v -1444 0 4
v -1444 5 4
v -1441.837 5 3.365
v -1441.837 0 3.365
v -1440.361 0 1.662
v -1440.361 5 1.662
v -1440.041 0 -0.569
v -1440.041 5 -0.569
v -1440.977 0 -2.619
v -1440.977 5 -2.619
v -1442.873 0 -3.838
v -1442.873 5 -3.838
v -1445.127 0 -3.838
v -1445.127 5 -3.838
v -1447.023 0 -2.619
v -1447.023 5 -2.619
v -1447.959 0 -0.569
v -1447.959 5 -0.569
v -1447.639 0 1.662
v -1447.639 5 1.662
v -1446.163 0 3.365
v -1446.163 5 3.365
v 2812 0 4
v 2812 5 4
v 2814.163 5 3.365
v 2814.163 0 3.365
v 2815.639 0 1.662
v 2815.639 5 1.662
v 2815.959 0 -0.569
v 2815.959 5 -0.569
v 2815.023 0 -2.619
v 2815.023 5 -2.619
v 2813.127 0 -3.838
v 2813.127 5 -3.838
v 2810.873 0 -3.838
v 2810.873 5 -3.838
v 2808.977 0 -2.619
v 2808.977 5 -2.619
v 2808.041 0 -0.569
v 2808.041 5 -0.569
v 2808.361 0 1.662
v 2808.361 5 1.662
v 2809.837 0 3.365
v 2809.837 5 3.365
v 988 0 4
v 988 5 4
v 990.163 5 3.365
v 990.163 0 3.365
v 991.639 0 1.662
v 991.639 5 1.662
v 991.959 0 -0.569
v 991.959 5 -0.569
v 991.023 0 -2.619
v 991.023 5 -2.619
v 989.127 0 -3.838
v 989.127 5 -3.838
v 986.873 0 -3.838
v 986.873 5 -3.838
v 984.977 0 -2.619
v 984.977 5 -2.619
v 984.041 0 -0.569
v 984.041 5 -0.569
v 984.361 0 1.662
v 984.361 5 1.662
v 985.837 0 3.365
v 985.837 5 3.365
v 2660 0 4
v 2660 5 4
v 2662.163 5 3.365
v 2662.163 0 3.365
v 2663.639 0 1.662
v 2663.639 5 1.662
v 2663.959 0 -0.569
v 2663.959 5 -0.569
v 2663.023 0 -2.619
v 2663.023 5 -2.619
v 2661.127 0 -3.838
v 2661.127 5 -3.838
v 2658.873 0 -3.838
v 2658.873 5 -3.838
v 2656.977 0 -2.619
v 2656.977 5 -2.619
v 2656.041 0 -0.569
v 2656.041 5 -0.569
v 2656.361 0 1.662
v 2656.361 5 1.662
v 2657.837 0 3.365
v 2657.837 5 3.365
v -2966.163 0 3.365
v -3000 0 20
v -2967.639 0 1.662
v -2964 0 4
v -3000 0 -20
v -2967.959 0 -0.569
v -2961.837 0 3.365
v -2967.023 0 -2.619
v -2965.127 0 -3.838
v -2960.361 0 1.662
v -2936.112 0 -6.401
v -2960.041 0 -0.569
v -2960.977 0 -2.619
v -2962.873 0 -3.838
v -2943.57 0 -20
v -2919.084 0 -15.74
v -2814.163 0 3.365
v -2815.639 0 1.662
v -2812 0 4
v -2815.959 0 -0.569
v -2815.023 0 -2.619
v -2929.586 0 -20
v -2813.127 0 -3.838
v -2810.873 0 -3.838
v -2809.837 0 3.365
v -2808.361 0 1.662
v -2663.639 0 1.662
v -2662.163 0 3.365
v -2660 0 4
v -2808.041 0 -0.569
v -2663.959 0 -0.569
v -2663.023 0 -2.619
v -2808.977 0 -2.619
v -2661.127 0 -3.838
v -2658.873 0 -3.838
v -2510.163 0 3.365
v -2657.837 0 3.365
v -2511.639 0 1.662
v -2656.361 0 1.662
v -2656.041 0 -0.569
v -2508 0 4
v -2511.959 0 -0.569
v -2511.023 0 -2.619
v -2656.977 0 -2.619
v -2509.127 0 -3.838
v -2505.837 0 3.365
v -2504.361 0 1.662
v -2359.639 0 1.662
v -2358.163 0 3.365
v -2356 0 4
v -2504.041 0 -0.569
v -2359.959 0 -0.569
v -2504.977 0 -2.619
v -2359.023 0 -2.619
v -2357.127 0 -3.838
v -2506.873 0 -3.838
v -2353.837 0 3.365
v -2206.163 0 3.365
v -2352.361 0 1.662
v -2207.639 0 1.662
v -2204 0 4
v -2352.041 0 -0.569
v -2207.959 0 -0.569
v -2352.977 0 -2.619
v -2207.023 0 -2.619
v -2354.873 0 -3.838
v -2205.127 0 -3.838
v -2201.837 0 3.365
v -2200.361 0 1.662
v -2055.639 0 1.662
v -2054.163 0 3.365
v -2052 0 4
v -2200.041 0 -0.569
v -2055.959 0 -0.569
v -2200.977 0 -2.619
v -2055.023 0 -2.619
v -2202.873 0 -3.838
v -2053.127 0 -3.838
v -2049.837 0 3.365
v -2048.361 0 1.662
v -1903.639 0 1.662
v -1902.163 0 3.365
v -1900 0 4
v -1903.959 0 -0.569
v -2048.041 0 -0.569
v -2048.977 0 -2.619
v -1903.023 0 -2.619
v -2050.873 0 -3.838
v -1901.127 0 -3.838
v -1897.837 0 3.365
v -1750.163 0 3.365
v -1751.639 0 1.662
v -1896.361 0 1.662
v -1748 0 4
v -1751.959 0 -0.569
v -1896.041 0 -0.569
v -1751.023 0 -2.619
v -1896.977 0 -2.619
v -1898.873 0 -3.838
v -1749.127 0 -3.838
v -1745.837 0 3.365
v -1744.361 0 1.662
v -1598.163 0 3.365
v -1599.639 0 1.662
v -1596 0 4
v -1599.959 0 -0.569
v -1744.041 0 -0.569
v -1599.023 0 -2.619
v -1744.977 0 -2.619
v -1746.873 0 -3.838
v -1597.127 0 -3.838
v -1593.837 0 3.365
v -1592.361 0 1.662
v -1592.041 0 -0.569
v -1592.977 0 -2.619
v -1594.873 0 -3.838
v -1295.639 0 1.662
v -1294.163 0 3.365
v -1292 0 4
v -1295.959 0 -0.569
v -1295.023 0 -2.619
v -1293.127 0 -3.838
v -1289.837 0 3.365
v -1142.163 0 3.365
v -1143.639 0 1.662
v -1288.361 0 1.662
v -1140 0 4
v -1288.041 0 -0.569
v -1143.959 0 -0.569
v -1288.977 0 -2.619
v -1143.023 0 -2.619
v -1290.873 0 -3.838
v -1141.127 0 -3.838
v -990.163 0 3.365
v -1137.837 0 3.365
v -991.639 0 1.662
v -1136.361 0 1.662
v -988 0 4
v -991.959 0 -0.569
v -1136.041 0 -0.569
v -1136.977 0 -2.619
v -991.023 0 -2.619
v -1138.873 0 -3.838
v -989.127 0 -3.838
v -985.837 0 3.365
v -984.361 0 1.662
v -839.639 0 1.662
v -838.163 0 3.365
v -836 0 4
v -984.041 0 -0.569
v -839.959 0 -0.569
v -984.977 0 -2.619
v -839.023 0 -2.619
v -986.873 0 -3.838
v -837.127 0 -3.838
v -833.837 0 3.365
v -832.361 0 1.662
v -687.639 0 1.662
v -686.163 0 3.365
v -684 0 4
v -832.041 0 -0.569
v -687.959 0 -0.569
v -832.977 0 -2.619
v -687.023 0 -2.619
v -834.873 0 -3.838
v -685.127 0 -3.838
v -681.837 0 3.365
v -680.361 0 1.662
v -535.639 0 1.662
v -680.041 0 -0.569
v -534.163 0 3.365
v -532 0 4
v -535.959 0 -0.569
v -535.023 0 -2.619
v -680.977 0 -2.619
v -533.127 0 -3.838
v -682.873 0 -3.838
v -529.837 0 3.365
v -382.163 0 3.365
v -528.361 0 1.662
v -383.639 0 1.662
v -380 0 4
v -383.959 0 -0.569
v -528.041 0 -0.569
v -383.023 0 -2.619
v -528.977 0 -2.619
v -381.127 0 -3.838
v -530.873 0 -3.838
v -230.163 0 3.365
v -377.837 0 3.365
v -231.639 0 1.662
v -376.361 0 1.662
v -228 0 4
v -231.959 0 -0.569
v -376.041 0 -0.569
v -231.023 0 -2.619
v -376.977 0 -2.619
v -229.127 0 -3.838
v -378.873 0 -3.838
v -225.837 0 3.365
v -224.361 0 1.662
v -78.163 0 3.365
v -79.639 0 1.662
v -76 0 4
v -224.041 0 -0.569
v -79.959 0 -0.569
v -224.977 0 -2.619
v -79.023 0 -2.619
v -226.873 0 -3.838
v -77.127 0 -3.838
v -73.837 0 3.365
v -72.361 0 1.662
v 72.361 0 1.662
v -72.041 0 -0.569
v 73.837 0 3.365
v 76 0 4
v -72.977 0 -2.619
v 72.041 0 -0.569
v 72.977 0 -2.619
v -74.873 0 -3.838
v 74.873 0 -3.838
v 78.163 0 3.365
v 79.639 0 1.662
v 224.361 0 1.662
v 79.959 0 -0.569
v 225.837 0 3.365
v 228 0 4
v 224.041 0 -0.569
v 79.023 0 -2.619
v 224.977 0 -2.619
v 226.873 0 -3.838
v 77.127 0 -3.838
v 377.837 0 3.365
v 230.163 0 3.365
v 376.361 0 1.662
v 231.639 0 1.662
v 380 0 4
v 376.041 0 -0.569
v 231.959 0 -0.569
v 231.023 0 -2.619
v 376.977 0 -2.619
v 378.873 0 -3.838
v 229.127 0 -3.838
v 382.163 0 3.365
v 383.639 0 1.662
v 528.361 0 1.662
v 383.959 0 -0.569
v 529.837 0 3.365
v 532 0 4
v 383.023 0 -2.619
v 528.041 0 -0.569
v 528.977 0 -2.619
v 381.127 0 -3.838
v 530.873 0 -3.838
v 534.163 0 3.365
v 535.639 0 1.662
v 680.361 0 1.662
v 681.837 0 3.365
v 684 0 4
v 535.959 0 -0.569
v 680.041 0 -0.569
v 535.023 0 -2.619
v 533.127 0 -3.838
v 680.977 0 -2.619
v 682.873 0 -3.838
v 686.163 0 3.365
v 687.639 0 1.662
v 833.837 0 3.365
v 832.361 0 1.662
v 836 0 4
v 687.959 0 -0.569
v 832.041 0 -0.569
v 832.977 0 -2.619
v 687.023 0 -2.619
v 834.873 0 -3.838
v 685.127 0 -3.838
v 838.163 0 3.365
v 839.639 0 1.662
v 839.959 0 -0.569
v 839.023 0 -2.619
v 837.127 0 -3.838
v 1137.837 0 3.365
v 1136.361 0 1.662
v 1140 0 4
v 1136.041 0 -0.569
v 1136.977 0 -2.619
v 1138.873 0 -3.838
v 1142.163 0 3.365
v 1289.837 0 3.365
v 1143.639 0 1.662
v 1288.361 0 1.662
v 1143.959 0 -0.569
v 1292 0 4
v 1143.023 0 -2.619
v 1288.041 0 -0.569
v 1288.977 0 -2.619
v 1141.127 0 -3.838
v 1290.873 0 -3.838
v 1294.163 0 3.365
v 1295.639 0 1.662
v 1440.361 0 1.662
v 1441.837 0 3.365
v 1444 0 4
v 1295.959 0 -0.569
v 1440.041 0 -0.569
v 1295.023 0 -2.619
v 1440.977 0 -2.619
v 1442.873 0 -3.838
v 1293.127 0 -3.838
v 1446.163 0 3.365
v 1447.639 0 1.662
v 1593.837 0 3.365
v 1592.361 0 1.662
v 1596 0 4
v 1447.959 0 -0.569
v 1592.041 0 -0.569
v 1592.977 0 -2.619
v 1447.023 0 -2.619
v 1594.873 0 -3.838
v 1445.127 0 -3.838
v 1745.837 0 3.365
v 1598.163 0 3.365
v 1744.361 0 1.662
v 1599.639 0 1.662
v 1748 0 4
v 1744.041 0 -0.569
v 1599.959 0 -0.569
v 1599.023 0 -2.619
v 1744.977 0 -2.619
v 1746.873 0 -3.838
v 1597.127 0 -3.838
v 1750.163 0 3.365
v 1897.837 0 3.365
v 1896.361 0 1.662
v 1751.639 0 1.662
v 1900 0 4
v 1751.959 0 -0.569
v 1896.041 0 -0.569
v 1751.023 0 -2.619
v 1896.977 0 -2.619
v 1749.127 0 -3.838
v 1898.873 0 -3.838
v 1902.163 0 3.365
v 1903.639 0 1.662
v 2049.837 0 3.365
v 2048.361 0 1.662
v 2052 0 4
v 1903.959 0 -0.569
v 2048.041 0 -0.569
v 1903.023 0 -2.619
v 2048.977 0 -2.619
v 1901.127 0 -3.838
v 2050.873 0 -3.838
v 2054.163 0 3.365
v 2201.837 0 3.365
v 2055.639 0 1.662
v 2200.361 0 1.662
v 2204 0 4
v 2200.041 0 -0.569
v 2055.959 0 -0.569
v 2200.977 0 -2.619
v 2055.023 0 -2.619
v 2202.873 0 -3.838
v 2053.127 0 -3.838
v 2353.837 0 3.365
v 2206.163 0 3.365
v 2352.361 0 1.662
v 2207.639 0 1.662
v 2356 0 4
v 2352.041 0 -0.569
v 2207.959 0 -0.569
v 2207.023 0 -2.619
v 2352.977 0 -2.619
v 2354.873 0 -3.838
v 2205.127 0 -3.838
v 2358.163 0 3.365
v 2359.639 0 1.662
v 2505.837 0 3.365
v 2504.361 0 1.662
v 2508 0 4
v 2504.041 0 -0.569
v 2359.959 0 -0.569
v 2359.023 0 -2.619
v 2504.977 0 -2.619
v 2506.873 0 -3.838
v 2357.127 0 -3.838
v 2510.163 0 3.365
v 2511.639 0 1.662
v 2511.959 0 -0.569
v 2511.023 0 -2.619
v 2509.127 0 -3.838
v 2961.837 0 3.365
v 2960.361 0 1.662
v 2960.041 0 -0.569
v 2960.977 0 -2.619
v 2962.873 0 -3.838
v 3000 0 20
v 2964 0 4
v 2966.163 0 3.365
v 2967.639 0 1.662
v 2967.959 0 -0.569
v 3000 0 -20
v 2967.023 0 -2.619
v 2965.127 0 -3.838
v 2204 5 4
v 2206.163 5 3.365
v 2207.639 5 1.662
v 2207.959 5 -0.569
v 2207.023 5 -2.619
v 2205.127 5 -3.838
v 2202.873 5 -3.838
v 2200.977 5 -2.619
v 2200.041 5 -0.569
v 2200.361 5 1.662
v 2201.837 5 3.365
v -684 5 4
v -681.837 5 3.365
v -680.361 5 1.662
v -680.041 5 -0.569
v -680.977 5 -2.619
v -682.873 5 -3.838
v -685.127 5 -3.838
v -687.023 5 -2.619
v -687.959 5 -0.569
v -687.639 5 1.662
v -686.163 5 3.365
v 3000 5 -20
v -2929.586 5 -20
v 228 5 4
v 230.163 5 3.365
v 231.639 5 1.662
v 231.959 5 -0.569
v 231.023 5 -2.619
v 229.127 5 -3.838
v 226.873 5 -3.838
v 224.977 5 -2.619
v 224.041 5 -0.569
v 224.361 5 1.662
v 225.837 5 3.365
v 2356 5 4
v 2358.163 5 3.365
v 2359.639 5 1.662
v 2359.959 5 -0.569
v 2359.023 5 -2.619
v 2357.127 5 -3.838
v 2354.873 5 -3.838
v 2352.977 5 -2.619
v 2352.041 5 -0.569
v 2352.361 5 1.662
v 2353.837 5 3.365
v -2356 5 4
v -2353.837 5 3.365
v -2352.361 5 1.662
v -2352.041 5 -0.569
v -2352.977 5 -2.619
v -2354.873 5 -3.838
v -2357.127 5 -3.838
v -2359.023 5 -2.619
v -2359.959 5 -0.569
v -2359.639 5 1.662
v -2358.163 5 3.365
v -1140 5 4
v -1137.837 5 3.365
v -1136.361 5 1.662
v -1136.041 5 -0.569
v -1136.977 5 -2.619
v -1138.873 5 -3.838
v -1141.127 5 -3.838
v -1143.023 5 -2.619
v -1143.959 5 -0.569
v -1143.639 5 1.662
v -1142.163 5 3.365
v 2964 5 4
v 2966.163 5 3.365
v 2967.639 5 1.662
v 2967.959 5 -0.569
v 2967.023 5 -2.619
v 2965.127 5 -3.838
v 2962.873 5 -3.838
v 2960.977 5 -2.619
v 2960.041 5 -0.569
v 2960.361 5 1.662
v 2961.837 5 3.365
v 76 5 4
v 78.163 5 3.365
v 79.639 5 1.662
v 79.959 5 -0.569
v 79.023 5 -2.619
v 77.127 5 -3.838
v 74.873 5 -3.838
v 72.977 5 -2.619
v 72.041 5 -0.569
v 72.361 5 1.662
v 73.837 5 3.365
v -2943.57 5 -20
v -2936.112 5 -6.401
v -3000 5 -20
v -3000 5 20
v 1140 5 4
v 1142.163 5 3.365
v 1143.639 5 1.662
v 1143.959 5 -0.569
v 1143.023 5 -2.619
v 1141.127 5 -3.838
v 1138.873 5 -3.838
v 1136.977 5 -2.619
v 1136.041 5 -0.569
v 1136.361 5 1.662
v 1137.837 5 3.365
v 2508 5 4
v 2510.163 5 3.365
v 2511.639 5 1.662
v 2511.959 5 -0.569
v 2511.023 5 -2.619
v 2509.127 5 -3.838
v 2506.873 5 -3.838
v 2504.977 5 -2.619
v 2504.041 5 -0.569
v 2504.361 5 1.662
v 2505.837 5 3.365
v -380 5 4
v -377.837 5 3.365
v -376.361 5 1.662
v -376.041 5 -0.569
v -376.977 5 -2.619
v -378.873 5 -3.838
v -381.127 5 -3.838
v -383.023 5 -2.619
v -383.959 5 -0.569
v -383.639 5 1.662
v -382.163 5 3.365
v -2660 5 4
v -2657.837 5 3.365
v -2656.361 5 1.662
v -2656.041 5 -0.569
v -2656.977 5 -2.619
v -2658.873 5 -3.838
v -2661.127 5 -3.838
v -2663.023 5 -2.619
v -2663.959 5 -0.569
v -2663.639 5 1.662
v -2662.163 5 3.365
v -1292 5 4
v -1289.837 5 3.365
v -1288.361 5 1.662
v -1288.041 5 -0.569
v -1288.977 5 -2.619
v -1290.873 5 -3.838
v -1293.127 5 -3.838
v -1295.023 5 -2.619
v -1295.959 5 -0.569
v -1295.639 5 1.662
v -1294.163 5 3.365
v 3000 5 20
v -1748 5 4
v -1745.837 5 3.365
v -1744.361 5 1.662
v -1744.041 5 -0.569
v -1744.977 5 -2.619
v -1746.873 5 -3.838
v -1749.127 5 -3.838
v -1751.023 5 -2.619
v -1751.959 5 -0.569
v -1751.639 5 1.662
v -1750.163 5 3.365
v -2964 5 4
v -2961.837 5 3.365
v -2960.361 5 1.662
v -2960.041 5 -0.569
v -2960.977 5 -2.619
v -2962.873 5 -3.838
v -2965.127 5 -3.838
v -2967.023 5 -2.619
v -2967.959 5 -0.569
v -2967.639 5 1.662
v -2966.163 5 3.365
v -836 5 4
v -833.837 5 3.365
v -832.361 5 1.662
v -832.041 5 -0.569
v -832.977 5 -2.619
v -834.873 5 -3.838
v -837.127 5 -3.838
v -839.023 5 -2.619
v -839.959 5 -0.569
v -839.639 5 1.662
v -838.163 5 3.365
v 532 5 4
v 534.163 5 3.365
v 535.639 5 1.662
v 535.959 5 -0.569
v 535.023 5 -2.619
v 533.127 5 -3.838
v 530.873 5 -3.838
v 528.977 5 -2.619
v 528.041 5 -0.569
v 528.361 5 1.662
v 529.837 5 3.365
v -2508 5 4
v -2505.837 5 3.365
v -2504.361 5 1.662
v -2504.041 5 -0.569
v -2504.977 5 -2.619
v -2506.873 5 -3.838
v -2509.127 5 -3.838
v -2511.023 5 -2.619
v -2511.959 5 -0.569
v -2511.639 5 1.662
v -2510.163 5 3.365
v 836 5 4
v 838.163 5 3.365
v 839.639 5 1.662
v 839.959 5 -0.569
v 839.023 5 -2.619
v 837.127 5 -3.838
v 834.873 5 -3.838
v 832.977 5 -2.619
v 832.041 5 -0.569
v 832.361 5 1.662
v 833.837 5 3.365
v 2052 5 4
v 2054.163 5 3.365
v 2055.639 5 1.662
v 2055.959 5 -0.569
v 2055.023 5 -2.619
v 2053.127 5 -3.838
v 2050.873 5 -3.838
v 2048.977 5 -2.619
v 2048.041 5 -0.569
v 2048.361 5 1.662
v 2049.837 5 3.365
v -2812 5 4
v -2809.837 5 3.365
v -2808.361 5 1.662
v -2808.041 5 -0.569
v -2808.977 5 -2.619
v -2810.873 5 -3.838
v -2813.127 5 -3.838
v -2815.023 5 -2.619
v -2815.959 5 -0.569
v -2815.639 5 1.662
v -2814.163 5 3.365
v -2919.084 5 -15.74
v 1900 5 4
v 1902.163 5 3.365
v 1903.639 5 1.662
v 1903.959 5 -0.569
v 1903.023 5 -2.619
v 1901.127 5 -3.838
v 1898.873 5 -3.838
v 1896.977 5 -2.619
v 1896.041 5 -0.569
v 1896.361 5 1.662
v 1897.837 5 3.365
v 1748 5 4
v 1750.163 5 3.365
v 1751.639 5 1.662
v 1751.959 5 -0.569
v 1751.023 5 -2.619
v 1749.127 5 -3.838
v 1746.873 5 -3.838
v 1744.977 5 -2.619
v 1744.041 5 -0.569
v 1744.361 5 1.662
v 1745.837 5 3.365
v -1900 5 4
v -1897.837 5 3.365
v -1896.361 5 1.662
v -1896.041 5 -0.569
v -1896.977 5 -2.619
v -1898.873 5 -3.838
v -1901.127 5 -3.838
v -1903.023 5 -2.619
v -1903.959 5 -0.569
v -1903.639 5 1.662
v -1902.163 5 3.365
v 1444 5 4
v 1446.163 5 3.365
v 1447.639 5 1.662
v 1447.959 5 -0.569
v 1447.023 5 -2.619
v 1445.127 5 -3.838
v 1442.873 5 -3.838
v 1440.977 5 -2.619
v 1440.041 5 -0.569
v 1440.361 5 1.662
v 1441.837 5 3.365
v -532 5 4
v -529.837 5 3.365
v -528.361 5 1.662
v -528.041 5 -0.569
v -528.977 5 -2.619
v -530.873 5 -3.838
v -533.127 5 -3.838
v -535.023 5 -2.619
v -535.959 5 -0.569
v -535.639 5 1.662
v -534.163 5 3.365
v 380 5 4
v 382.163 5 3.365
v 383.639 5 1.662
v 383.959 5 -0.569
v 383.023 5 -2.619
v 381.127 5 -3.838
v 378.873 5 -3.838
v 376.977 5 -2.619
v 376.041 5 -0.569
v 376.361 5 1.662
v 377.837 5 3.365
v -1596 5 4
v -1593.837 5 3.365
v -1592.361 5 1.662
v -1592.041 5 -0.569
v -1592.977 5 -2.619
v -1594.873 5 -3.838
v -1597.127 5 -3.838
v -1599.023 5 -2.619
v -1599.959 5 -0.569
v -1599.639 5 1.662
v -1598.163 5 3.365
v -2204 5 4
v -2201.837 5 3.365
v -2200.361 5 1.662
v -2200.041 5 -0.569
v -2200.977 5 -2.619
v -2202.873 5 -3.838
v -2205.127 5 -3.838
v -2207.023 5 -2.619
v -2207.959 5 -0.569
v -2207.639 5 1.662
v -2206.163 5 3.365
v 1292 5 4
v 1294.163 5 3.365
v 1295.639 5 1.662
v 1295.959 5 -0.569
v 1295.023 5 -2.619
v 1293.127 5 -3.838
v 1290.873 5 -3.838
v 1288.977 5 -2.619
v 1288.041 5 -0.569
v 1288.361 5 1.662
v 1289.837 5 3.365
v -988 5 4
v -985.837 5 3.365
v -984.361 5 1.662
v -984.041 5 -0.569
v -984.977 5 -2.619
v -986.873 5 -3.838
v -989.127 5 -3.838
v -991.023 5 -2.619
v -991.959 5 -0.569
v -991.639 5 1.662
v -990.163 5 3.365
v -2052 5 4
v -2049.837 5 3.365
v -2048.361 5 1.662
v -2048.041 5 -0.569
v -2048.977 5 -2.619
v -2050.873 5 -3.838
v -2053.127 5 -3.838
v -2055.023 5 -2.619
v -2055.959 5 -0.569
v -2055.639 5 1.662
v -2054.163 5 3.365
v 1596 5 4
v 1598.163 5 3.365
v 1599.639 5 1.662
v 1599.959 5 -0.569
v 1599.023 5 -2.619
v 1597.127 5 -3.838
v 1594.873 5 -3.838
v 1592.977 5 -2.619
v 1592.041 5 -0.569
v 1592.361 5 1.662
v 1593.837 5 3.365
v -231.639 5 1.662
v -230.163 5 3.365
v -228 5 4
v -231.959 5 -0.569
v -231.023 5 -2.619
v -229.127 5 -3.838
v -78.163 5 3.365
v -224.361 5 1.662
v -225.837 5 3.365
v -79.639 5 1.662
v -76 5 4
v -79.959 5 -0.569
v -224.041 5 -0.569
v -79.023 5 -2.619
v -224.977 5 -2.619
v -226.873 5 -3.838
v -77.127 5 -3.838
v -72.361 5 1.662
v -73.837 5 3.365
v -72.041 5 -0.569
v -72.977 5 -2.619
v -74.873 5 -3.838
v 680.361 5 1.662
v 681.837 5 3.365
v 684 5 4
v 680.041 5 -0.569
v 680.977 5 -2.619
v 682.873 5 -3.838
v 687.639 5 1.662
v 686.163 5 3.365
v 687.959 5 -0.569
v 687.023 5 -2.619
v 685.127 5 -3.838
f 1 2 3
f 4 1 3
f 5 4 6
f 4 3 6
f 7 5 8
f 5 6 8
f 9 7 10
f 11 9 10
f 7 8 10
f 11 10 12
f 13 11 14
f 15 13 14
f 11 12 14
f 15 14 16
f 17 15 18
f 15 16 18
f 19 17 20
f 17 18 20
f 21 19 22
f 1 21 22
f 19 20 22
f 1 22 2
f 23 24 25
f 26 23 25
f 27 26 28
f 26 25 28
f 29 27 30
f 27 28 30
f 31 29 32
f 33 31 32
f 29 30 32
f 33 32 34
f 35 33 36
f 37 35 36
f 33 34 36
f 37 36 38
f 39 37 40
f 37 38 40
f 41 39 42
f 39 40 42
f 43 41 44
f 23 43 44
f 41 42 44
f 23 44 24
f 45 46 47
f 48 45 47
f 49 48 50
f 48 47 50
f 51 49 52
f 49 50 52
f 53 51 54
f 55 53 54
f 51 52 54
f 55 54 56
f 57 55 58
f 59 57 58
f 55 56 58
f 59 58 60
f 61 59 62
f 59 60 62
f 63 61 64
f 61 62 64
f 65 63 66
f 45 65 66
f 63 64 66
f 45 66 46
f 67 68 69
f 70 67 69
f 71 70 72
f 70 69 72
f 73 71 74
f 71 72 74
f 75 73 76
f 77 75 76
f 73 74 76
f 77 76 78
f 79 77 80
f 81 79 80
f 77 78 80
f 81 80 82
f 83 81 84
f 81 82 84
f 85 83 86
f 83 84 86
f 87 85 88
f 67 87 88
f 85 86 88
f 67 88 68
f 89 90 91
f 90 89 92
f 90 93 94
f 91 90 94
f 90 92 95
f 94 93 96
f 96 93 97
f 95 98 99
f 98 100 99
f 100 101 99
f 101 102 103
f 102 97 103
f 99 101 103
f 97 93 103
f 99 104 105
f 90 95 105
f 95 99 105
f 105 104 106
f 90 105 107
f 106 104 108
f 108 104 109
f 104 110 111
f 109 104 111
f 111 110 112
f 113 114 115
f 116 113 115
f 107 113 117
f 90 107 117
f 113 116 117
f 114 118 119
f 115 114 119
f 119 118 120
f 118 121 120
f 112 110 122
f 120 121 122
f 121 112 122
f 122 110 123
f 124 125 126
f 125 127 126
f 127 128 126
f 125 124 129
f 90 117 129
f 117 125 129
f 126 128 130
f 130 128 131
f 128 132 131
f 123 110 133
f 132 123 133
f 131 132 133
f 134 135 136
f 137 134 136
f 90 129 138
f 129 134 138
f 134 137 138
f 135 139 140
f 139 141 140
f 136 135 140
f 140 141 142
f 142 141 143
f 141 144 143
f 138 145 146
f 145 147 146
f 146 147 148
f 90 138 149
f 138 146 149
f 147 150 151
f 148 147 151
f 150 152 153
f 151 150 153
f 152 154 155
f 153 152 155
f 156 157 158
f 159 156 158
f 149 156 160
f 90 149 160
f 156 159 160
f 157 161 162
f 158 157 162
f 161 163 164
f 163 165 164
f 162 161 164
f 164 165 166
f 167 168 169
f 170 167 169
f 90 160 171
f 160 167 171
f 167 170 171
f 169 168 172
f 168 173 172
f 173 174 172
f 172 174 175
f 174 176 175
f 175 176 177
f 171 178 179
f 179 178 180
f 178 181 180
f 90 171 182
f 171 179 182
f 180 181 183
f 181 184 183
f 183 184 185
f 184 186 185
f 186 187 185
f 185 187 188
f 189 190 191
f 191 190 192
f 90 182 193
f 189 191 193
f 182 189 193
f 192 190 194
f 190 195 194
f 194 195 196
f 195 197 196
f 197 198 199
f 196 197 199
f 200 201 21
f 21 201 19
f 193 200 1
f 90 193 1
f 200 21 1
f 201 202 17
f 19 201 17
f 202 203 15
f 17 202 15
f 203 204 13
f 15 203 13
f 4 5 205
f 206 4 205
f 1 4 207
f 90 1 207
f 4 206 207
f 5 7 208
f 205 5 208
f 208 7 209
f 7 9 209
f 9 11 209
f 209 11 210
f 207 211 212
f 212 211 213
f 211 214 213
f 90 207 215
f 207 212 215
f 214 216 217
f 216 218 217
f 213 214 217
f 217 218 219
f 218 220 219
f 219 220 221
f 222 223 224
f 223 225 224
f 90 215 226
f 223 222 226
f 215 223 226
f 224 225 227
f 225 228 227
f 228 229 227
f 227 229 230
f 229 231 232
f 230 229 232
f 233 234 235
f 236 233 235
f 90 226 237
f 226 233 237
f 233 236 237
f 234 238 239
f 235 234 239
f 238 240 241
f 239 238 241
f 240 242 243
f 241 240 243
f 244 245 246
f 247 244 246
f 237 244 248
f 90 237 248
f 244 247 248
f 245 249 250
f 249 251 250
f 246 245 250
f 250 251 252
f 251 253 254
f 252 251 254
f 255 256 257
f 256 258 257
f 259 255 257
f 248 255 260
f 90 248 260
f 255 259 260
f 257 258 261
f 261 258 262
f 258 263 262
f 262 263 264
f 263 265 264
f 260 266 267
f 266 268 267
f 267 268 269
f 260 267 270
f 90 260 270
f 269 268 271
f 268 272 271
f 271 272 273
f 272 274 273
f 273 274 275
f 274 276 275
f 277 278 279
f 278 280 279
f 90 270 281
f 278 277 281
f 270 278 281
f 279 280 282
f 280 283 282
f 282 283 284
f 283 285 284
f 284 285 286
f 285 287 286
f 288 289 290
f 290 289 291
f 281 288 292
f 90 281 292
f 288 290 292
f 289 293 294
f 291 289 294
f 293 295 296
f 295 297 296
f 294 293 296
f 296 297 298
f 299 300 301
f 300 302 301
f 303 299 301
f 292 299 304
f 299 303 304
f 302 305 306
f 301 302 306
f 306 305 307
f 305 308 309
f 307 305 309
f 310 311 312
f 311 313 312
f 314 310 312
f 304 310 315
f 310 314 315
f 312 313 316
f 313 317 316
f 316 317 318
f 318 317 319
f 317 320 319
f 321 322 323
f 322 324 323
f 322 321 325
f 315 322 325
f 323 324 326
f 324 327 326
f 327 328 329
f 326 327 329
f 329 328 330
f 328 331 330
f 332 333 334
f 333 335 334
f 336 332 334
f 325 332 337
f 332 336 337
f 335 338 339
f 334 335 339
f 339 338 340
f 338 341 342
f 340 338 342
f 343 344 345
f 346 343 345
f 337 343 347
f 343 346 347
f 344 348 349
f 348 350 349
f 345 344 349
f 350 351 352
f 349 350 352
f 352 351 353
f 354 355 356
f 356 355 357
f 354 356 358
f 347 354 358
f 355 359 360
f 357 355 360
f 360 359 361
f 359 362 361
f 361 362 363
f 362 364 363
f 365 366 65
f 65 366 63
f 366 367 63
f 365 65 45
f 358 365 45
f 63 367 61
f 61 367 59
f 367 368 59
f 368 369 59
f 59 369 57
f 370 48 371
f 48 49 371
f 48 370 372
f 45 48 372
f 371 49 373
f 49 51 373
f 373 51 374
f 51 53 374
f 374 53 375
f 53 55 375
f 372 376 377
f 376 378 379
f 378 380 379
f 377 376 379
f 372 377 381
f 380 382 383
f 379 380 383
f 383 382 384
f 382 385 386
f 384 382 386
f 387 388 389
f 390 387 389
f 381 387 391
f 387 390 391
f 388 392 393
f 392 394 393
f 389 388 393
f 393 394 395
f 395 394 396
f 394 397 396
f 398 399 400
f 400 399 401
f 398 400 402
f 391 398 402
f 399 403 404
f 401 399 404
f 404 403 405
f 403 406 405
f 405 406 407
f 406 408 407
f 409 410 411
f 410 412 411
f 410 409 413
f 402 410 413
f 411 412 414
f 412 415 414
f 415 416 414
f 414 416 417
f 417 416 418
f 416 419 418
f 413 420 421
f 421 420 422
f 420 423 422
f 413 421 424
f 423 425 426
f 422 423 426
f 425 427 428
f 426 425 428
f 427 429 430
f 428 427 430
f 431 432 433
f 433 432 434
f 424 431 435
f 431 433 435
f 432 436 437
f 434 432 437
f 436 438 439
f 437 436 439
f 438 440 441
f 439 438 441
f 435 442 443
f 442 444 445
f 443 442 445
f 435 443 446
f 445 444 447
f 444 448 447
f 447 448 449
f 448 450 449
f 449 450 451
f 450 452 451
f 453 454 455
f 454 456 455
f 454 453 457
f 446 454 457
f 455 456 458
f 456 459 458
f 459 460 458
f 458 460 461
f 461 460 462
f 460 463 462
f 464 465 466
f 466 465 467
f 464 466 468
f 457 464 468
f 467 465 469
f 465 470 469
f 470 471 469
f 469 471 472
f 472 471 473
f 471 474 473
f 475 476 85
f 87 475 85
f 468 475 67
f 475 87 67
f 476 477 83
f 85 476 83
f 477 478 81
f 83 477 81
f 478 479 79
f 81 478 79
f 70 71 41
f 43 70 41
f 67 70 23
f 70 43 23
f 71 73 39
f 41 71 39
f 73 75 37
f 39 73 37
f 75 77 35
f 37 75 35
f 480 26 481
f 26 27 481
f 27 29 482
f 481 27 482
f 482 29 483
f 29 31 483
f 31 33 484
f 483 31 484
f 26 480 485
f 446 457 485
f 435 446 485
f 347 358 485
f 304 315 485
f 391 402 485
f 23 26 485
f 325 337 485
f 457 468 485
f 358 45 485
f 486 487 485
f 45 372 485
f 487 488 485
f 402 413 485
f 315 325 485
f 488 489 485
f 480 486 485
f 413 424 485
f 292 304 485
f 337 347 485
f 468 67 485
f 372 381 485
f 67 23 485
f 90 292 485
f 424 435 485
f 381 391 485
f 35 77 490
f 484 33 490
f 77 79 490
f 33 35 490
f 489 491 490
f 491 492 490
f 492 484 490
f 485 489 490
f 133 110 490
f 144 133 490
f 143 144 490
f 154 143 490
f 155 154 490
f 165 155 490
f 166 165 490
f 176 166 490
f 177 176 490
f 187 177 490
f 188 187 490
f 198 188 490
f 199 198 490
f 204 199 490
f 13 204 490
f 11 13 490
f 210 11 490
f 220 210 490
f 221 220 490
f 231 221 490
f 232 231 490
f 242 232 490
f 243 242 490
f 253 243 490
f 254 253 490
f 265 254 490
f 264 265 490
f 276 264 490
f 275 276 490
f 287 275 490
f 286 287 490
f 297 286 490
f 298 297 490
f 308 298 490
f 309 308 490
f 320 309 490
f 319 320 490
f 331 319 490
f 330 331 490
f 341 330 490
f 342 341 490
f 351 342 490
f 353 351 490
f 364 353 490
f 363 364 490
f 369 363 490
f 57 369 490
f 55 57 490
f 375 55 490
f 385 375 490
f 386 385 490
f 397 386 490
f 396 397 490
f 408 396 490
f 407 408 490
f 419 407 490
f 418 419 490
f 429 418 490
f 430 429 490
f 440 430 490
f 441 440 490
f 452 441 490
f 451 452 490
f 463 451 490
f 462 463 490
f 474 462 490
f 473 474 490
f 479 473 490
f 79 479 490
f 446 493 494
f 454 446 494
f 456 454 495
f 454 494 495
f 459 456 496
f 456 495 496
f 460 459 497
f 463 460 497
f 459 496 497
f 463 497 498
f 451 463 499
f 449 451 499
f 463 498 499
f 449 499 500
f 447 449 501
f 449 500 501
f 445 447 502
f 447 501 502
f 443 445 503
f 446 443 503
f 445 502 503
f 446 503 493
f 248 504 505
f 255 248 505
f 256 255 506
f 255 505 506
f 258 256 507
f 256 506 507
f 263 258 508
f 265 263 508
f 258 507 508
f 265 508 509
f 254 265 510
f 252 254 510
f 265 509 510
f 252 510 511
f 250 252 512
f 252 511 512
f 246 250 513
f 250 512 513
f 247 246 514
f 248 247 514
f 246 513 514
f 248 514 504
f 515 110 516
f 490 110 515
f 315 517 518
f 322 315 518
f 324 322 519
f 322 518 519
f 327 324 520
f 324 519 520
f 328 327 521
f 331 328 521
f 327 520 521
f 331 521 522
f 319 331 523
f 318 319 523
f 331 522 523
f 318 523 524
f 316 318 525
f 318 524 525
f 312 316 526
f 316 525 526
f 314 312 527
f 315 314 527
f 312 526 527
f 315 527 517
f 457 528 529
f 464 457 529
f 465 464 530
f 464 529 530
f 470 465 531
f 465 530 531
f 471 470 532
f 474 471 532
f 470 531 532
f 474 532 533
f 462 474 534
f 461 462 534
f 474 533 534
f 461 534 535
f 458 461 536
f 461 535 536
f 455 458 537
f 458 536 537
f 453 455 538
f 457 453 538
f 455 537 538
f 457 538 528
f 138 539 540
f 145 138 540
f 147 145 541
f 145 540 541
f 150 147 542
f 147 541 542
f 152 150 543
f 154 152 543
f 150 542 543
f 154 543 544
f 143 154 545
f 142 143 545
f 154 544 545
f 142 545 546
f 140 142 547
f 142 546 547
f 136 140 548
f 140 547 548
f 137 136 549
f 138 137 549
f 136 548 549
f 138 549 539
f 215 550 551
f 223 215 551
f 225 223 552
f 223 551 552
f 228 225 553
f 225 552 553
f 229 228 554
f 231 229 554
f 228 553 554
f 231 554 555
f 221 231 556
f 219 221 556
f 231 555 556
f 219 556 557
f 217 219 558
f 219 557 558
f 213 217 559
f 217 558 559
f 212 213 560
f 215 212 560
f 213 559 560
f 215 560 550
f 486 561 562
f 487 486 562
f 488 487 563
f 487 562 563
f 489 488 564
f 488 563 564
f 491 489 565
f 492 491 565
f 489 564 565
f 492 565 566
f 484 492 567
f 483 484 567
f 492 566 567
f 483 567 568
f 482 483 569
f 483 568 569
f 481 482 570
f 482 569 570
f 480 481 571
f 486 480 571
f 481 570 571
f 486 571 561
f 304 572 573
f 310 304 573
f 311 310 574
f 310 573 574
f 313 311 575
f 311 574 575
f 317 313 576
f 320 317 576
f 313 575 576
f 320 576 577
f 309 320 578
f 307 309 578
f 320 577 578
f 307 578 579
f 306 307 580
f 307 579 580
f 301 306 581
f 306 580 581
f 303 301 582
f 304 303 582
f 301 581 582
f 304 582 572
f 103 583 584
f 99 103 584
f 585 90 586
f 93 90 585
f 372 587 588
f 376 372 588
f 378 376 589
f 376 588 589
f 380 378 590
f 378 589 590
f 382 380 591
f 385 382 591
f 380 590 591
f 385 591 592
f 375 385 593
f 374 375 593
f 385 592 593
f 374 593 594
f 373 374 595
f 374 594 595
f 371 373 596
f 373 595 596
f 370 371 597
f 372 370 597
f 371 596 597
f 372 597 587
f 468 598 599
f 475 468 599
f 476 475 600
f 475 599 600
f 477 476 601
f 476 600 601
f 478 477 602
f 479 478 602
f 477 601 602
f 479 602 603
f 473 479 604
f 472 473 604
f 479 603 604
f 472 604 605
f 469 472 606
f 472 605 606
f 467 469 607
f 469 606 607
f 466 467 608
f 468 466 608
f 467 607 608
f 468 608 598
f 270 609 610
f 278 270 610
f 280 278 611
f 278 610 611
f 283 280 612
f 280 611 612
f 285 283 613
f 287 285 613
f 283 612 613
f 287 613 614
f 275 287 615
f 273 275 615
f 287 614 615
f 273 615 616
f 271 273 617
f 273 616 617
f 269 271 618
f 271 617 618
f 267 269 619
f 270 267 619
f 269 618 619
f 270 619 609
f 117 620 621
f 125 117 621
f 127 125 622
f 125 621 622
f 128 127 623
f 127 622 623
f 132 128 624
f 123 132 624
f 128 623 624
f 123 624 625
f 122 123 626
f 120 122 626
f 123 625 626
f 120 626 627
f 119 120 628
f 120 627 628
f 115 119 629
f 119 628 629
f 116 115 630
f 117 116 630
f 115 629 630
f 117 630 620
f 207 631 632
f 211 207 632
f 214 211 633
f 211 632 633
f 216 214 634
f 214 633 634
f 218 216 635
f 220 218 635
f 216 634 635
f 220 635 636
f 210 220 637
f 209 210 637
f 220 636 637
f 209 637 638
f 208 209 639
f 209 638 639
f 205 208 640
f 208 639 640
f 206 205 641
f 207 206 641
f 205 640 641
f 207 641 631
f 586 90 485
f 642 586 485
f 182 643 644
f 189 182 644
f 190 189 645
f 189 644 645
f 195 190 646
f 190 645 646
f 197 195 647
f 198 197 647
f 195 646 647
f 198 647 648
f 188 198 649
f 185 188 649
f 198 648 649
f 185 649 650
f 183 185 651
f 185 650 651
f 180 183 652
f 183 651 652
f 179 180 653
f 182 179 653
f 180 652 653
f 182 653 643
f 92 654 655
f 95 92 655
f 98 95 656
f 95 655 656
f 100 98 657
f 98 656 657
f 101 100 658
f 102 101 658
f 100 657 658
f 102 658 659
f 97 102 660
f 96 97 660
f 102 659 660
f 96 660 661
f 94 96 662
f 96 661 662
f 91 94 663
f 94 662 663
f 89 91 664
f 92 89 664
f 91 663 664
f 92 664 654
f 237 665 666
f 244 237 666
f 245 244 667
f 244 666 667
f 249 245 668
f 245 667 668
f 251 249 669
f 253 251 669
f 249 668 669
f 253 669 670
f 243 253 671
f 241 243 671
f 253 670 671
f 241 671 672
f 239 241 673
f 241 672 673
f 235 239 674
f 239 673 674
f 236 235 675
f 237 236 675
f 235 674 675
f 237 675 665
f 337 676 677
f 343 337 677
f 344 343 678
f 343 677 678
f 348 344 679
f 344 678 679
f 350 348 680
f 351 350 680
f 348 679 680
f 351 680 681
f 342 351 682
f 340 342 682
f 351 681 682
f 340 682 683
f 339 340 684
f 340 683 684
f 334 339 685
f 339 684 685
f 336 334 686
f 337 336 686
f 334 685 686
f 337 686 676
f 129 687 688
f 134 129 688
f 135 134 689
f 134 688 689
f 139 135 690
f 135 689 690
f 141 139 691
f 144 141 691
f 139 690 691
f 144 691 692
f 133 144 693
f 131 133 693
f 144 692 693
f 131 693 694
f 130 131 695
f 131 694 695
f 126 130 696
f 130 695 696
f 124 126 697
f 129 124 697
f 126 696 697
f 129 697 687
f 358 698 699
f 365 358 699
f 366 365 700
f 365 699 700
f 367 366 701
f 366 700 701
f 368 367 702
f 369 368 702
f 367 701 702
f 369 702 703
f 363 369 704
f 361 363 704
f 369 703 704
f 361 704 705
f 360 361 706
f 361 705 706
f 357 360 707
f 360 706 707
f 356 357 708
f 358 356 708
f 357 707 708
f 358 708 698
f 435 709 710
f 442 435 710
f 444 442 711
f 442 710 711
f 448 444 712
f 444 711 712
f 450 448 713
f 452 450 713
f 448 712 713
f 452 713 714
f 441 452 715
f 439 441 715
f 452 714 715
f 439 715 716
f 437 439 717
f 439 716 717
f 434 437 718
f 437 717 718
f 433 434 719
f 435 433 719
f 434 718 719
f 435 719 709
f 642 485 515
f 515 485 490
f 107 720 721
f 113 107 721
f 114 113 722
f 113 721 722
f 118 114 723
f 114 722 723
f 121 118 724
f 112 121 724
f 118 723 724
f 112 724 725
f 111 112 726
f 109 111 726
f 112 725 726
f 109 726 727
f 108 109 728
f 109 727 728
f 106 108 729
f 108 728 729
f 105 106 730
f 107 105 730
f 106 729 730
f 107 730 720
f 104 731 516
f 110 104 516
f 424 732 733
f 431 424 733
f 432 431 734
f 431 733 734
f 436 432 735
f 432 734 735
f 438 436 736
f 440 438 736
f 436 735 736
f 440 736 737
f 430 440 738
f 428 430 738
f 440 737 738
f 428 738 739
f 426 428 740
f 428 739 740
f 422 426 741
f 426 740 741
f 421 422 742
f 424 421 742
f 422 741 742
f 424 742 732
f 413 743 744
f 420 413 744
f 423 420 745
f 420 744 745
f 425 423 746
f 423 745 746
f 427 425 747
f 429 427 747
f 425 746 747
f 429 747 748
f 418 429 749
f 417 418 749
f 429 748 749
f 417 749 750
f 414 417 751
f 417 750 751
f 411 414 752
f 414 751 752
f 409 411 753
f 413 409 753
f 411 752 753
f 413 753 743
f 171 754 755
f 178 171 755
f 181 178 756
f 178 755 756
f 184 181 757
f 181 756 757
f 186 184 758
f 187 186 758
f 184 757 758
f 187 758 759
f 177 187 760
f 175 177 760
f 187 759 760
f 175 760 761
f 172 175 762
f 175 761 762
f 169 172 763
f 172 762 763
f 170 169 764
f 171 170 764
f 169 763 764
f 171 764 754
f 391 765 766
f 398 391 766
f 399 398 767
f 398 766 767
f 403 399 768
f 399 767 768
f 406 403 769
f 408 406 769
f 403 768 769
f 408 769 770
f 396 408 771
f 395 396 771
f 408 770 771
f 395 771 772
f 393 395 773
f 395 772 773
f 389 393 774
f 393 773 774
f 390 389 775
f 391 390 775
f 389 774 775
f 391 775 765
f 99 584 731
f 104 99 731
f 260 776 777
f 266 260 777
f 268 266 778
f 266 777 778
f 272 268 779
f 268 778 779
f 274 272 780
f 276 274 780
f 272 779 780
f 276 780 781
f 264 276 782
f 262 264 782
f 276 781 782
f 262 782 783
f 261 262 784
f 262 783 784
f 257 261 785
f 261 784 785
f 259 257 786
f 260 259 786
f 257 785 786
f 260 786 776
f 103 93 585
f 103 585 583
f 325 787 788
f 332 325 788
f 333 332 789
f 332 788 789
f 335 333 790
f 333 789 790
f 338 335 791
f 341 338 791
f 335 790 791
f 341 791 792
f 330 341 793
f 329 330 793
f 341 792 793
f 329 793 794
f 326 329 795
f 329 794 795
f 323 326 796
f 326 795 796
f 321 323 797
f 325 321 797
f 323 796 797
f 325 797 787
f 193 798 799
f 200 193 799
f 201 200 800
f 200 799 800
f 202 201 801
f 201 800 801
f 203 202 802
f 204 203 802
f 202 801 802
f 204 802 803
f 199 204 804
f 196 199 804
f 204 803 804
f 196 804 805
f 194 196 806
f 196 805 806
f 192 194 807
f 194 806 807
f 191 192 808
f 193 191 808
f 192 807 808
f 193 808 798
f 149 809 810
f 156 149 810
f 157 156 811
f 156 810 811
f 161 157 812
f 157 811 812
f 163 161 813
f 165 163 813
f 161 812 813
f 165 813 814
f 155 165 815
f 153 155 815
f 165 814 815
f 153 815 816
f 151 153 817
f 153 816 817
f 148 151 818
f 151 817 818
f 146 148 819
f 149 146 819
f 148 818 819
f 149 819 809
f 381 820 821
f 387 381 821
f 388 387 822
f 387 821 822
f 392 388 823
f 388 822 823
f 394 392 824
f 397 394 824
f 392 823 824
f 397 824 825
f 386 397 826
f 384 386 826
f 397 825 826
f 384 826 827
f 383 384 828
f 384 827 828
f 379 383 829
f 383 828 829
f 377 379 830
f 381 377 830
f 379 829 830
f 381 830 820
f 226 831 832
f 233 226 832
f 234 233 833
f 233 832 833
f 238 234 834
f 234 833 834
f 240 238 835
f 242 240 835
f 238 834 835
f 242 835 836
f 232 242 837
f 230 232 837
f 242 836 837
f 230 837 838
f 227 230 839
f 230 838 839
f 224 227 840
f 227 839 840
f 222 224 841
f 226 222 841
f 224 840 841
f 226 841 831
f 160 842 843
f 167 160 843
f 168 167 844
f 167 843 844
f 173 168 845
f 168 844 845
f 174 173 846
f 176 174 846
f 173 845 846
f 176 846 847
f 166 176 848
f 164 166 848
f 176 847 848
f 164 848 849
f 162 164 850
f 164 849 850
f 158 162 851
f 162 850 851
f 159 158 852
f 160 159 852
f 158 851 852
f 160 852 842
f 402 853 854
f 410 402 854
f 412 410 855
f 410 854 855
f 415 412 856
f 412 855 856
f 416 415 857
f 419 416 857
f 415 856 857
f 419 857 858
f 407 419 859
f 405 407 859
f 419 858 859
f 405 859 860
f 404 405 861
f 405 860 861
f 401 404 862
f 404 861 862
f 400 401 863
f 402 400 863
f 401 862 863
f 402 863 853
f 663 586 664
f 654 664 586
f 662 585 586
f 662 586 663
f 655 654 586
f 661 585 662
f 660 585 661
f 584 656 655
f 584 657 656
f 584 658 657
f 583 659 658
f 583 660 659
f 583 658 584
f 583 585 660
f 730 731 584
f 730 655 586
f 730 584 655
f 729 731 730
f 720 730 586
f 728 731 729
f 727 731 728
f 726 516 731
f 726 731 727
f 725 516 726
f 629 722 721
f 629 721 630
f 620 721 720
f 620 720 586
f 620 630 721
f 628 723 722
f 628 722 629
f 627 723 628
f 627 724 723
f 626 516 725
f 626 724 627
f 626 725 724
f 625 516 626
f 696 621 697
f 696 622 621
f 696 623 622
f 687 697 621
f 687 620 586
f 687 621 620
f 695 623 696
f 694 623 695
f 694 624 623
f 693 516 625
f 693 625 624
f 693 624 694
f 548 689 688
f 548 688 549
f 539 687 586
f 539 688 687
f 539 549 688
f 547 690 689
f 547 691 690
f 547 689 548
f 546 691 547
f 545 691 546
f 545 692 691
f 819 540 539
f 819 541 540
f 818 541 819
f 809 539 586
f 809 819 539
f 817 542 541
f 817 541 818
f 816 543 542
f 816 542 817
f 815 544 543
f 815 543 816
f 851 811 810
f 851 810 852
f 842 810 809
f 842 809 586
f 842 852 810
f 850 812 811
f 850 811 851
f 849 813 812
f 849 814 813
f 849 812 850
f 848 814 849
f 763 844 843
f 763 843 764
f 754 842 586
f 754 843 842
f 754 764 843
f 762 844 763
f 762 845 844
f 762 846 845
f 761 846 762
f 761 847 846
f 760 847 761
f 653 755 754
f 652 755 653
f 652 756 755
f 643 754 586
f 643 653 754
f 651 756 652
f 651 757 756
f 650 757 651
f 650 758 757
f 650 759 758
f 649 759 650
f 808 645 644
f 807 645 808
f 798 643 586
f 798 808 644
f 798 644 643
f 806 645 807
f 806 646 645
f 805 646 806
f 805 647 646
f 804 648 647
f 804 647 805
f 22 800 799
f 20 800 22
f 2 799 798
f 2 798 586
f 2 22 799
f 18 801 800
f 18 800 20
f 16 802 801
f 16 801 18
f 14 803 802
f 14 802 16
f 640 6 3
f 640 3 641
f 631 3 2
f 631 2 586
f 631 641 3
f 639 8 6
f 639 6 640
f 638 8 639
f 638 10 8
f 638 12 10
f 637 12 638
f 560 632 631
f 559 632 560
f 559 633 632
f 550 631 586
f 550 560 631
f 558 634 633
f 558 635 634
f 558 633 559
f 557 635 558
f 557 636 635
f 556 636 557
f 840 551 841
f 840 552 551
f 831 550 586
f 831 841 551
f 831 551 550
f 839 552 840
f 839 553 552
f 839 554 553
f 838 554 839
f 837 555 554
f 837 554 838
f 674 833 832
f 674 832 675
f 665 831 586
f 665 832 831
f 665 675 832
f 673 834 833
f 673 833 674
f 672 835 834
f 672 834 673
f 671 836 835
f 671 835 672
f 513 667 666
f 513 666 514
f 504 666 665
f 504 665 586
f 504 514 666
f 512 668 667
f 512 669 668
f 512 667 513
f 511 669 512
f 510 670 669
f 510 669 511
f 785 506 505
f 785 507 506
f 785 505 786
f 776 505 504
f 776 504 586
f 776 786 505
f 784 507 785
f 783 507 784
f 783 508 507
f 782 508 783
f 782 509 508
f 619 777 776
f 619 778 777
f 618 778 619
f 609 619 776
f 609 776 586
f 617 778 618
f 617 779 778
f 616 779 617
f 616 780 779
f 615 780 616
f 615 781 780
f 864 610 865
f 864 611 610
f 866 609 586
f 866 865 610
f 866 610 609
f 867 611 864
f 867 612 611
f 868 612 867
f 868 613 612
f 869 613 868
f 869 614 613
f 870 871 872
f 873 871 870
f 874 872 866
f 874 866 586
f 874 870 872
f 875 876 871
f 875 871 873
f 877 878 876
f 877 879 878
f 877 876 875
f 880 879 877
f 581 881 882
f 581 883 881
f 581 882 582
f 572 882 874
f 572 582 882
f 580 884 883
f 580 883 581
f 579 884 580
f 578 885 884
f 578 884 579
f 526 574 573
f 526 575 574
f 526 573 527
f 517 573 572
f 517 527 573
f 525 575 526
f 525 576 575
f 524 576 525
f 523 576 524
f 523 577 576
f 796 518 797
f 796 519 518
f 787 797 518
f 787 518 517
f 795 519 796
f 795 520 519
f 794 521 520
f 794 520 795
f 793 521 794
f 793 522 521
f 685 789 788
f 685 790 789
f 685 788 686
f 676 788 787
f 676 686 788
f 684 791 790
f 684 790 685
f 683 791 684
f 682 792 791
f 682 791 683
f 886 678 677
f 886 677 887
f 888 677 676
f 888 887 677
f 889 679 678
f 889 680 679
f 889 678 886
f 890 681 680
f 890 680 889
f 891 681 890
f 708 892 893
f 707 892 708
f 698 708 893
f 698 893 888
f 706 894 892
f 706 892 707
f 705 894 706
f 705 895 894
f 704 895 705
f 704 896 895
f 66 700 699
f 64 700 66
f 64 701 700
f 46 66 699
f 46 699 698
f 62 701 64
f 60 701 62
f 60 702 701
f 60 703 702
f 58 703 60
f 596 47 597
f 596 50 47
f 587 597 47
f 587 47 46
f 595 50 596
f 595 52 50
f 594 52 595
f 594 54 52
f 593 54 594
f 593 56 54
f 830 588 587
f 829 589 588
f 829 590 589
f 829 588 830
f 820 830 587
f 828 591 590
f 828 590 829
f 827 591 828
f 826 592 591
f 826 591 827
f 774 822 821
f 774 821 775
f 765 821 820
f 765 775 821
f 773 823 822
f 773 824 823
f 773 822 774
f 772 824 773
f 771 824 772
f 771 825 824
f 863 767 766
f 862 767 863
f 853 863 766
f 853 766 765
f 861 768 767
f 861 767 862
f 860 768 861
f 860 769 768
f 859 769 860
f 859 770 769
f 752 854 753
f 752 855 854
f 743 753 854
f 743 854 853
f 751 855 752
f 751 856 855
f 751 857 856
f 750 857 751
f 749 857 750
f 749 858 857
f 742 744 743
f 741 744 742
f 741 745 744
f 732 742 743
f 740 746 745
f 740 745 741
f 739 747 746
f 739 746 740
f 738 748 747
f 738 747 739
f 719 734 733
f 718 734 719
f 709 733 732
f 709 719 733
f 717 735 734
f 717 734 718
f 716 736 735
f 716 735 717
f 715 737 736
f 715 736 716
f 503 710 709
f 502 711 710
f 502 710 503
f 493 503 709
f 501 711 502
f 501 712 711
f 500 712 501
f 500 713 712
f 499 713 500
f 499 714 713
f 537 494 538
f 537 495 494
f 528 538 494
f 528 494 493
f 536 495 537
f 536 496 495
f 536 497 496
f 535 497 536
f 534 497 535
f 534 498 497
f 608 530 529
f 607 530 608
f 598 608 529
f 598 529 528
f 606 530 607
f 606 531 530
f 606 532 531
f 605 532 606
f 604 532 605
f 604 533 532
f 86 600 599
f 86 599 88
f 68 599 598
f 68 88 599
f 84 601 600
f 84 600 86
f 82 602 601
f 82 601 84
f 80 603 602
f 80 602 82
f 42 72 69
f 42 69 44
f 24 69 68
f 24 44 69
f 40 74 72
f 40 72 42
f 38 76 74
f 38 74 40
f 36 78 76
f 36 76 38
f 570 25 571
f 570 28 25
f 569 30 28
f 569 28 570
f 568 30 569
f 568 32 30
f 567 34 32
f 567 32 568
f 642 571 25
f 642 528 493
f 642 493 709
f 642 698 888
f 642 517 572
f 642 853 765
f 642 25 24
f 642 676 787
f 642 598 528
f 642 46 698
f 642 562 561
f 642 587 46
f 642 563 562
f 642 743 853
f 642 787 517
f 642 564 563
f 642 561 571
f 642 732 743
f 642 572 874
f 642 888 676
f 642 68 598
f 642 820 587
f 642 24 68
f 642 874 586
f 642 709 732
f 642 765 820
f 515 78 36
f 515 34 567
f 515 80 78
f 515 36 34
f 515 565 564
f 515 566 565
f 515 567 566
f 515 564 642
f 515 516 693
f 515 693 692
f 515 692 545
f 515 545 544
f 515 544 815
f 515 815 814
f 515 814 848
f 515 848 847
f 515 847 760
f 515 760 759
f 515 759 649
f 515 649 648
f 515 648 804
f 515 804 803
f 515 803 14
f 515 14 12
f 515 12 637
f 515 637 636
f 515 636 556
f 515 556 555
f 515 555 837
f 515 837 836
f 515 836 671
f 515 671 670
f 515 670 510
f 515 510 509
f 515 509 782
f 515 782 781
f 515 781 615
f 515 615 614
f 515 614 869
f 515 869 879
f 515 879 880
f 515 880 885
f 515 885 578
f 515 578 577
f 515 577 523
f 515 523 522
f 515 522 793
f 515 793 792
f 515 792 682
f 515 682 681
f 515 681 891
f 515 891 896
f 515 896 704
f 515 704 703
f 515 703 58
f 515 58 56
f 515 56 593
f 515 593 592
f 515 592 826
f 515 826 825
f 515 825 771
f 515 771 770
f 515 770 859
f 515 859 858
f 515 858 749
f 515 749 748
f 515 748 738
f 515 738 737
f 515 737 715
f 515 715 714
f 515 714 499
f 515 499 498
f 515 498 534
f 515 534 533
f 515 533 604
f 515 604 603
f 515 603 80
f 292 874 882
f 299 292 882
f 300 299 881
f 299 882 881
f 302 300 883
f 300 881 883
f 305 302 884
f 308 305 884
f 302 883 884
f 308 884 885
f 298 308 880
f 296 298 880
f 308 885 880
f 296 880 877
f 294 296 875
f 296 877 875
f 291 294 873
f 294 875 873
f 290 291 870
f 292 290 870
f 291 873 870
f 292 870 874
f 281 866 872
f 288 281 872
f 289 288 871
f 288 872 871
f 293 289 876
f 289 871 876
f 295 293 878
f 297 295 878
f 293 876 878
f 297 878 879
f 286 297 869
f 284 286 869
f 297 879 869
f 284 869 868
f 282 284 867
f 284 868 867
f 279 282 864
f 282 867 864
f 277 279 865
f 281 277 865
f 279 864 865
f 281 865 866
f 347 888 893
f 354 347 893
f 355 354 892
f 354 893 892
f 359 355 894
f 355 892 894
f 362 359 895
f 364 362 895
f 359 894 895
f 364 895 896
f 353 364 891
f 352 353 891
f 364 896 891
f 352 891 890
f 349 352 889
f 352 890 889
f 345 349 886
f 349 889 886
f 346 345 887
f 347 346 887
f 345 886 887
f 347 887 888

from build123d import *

# Parameters (mm, degrees)
IZIM1_W                     = 6000
IZIM1_H                     = 40
Y_KSEKLIK_EKSTR_ZYON1_DEPTH = 5
IZIM2_R                     = 4
KES_EKSTR_ZYON1_DEPTH       = 5
L_O_ALTMA1_COUNT            = 40
L_O_ALTMA1_PITCH            = 152
KES_EKSTR_ZYON2_DEPTH       = 5


with BuildPart() as part:
    # Çizim1 → Yükseklik-Ekstrüzyon1 (new body)
    with BuildSketch(Plane(origin=(0, 0, 0), x_dir=(1, 0, 0), z_dir=(0, 1, 0))):
        Rectangle(IZIM1_W, IZIM1_H)
    extrude(amount=Y_KSEKLIK_EKSTR_ZYON1_DEPTH)

    # Çizim2 → Kes-Ekstrüzyon1 (cut)
    with BuildSketch(Plane(origin=(0, 5, 0), x_dir=(1, 0, 0), z_dir=(0, 1, 0))):
        with Locations(Location((-2964, 0, 0), (0, 0, 270))):
            Circle(IZIM2_R)
    kes_ekstr_zyon1 = extrude(amount=-KES_EKSTR_ZYON1_DEPTH, mode=Mode.SUBTRACT)

    # LÇoğaltma1: Kes-Ekstrüzyon1 ×40
    with Locations(*[(i * L_O_ALTMA1_PITCH, 0, 0) for i in range(1, L_O_ALTMA1_COUNT)]):
        add(kes_ekstr_zyon1, mode=Mode.SUBTRACT)

    # Çizim3 → Kes-Ekstrüzyon2 (cut)
    with BuildSketch(Plane(origin=(0, 5, 0), x_dir=(1, 0, 0), z_dir=(0, 1, 0))):
        Polygon((-2943.570103911, 20), (-2936.111815354, 6.401329737), (-2919.083902826, 15.74041089), (-2929.585812867, 20), align=None)
    extrude(amount=-KES_EKSTR_ZYON2_DEPTH, mode=Mode.SUBTRACT)


solid = part.part
